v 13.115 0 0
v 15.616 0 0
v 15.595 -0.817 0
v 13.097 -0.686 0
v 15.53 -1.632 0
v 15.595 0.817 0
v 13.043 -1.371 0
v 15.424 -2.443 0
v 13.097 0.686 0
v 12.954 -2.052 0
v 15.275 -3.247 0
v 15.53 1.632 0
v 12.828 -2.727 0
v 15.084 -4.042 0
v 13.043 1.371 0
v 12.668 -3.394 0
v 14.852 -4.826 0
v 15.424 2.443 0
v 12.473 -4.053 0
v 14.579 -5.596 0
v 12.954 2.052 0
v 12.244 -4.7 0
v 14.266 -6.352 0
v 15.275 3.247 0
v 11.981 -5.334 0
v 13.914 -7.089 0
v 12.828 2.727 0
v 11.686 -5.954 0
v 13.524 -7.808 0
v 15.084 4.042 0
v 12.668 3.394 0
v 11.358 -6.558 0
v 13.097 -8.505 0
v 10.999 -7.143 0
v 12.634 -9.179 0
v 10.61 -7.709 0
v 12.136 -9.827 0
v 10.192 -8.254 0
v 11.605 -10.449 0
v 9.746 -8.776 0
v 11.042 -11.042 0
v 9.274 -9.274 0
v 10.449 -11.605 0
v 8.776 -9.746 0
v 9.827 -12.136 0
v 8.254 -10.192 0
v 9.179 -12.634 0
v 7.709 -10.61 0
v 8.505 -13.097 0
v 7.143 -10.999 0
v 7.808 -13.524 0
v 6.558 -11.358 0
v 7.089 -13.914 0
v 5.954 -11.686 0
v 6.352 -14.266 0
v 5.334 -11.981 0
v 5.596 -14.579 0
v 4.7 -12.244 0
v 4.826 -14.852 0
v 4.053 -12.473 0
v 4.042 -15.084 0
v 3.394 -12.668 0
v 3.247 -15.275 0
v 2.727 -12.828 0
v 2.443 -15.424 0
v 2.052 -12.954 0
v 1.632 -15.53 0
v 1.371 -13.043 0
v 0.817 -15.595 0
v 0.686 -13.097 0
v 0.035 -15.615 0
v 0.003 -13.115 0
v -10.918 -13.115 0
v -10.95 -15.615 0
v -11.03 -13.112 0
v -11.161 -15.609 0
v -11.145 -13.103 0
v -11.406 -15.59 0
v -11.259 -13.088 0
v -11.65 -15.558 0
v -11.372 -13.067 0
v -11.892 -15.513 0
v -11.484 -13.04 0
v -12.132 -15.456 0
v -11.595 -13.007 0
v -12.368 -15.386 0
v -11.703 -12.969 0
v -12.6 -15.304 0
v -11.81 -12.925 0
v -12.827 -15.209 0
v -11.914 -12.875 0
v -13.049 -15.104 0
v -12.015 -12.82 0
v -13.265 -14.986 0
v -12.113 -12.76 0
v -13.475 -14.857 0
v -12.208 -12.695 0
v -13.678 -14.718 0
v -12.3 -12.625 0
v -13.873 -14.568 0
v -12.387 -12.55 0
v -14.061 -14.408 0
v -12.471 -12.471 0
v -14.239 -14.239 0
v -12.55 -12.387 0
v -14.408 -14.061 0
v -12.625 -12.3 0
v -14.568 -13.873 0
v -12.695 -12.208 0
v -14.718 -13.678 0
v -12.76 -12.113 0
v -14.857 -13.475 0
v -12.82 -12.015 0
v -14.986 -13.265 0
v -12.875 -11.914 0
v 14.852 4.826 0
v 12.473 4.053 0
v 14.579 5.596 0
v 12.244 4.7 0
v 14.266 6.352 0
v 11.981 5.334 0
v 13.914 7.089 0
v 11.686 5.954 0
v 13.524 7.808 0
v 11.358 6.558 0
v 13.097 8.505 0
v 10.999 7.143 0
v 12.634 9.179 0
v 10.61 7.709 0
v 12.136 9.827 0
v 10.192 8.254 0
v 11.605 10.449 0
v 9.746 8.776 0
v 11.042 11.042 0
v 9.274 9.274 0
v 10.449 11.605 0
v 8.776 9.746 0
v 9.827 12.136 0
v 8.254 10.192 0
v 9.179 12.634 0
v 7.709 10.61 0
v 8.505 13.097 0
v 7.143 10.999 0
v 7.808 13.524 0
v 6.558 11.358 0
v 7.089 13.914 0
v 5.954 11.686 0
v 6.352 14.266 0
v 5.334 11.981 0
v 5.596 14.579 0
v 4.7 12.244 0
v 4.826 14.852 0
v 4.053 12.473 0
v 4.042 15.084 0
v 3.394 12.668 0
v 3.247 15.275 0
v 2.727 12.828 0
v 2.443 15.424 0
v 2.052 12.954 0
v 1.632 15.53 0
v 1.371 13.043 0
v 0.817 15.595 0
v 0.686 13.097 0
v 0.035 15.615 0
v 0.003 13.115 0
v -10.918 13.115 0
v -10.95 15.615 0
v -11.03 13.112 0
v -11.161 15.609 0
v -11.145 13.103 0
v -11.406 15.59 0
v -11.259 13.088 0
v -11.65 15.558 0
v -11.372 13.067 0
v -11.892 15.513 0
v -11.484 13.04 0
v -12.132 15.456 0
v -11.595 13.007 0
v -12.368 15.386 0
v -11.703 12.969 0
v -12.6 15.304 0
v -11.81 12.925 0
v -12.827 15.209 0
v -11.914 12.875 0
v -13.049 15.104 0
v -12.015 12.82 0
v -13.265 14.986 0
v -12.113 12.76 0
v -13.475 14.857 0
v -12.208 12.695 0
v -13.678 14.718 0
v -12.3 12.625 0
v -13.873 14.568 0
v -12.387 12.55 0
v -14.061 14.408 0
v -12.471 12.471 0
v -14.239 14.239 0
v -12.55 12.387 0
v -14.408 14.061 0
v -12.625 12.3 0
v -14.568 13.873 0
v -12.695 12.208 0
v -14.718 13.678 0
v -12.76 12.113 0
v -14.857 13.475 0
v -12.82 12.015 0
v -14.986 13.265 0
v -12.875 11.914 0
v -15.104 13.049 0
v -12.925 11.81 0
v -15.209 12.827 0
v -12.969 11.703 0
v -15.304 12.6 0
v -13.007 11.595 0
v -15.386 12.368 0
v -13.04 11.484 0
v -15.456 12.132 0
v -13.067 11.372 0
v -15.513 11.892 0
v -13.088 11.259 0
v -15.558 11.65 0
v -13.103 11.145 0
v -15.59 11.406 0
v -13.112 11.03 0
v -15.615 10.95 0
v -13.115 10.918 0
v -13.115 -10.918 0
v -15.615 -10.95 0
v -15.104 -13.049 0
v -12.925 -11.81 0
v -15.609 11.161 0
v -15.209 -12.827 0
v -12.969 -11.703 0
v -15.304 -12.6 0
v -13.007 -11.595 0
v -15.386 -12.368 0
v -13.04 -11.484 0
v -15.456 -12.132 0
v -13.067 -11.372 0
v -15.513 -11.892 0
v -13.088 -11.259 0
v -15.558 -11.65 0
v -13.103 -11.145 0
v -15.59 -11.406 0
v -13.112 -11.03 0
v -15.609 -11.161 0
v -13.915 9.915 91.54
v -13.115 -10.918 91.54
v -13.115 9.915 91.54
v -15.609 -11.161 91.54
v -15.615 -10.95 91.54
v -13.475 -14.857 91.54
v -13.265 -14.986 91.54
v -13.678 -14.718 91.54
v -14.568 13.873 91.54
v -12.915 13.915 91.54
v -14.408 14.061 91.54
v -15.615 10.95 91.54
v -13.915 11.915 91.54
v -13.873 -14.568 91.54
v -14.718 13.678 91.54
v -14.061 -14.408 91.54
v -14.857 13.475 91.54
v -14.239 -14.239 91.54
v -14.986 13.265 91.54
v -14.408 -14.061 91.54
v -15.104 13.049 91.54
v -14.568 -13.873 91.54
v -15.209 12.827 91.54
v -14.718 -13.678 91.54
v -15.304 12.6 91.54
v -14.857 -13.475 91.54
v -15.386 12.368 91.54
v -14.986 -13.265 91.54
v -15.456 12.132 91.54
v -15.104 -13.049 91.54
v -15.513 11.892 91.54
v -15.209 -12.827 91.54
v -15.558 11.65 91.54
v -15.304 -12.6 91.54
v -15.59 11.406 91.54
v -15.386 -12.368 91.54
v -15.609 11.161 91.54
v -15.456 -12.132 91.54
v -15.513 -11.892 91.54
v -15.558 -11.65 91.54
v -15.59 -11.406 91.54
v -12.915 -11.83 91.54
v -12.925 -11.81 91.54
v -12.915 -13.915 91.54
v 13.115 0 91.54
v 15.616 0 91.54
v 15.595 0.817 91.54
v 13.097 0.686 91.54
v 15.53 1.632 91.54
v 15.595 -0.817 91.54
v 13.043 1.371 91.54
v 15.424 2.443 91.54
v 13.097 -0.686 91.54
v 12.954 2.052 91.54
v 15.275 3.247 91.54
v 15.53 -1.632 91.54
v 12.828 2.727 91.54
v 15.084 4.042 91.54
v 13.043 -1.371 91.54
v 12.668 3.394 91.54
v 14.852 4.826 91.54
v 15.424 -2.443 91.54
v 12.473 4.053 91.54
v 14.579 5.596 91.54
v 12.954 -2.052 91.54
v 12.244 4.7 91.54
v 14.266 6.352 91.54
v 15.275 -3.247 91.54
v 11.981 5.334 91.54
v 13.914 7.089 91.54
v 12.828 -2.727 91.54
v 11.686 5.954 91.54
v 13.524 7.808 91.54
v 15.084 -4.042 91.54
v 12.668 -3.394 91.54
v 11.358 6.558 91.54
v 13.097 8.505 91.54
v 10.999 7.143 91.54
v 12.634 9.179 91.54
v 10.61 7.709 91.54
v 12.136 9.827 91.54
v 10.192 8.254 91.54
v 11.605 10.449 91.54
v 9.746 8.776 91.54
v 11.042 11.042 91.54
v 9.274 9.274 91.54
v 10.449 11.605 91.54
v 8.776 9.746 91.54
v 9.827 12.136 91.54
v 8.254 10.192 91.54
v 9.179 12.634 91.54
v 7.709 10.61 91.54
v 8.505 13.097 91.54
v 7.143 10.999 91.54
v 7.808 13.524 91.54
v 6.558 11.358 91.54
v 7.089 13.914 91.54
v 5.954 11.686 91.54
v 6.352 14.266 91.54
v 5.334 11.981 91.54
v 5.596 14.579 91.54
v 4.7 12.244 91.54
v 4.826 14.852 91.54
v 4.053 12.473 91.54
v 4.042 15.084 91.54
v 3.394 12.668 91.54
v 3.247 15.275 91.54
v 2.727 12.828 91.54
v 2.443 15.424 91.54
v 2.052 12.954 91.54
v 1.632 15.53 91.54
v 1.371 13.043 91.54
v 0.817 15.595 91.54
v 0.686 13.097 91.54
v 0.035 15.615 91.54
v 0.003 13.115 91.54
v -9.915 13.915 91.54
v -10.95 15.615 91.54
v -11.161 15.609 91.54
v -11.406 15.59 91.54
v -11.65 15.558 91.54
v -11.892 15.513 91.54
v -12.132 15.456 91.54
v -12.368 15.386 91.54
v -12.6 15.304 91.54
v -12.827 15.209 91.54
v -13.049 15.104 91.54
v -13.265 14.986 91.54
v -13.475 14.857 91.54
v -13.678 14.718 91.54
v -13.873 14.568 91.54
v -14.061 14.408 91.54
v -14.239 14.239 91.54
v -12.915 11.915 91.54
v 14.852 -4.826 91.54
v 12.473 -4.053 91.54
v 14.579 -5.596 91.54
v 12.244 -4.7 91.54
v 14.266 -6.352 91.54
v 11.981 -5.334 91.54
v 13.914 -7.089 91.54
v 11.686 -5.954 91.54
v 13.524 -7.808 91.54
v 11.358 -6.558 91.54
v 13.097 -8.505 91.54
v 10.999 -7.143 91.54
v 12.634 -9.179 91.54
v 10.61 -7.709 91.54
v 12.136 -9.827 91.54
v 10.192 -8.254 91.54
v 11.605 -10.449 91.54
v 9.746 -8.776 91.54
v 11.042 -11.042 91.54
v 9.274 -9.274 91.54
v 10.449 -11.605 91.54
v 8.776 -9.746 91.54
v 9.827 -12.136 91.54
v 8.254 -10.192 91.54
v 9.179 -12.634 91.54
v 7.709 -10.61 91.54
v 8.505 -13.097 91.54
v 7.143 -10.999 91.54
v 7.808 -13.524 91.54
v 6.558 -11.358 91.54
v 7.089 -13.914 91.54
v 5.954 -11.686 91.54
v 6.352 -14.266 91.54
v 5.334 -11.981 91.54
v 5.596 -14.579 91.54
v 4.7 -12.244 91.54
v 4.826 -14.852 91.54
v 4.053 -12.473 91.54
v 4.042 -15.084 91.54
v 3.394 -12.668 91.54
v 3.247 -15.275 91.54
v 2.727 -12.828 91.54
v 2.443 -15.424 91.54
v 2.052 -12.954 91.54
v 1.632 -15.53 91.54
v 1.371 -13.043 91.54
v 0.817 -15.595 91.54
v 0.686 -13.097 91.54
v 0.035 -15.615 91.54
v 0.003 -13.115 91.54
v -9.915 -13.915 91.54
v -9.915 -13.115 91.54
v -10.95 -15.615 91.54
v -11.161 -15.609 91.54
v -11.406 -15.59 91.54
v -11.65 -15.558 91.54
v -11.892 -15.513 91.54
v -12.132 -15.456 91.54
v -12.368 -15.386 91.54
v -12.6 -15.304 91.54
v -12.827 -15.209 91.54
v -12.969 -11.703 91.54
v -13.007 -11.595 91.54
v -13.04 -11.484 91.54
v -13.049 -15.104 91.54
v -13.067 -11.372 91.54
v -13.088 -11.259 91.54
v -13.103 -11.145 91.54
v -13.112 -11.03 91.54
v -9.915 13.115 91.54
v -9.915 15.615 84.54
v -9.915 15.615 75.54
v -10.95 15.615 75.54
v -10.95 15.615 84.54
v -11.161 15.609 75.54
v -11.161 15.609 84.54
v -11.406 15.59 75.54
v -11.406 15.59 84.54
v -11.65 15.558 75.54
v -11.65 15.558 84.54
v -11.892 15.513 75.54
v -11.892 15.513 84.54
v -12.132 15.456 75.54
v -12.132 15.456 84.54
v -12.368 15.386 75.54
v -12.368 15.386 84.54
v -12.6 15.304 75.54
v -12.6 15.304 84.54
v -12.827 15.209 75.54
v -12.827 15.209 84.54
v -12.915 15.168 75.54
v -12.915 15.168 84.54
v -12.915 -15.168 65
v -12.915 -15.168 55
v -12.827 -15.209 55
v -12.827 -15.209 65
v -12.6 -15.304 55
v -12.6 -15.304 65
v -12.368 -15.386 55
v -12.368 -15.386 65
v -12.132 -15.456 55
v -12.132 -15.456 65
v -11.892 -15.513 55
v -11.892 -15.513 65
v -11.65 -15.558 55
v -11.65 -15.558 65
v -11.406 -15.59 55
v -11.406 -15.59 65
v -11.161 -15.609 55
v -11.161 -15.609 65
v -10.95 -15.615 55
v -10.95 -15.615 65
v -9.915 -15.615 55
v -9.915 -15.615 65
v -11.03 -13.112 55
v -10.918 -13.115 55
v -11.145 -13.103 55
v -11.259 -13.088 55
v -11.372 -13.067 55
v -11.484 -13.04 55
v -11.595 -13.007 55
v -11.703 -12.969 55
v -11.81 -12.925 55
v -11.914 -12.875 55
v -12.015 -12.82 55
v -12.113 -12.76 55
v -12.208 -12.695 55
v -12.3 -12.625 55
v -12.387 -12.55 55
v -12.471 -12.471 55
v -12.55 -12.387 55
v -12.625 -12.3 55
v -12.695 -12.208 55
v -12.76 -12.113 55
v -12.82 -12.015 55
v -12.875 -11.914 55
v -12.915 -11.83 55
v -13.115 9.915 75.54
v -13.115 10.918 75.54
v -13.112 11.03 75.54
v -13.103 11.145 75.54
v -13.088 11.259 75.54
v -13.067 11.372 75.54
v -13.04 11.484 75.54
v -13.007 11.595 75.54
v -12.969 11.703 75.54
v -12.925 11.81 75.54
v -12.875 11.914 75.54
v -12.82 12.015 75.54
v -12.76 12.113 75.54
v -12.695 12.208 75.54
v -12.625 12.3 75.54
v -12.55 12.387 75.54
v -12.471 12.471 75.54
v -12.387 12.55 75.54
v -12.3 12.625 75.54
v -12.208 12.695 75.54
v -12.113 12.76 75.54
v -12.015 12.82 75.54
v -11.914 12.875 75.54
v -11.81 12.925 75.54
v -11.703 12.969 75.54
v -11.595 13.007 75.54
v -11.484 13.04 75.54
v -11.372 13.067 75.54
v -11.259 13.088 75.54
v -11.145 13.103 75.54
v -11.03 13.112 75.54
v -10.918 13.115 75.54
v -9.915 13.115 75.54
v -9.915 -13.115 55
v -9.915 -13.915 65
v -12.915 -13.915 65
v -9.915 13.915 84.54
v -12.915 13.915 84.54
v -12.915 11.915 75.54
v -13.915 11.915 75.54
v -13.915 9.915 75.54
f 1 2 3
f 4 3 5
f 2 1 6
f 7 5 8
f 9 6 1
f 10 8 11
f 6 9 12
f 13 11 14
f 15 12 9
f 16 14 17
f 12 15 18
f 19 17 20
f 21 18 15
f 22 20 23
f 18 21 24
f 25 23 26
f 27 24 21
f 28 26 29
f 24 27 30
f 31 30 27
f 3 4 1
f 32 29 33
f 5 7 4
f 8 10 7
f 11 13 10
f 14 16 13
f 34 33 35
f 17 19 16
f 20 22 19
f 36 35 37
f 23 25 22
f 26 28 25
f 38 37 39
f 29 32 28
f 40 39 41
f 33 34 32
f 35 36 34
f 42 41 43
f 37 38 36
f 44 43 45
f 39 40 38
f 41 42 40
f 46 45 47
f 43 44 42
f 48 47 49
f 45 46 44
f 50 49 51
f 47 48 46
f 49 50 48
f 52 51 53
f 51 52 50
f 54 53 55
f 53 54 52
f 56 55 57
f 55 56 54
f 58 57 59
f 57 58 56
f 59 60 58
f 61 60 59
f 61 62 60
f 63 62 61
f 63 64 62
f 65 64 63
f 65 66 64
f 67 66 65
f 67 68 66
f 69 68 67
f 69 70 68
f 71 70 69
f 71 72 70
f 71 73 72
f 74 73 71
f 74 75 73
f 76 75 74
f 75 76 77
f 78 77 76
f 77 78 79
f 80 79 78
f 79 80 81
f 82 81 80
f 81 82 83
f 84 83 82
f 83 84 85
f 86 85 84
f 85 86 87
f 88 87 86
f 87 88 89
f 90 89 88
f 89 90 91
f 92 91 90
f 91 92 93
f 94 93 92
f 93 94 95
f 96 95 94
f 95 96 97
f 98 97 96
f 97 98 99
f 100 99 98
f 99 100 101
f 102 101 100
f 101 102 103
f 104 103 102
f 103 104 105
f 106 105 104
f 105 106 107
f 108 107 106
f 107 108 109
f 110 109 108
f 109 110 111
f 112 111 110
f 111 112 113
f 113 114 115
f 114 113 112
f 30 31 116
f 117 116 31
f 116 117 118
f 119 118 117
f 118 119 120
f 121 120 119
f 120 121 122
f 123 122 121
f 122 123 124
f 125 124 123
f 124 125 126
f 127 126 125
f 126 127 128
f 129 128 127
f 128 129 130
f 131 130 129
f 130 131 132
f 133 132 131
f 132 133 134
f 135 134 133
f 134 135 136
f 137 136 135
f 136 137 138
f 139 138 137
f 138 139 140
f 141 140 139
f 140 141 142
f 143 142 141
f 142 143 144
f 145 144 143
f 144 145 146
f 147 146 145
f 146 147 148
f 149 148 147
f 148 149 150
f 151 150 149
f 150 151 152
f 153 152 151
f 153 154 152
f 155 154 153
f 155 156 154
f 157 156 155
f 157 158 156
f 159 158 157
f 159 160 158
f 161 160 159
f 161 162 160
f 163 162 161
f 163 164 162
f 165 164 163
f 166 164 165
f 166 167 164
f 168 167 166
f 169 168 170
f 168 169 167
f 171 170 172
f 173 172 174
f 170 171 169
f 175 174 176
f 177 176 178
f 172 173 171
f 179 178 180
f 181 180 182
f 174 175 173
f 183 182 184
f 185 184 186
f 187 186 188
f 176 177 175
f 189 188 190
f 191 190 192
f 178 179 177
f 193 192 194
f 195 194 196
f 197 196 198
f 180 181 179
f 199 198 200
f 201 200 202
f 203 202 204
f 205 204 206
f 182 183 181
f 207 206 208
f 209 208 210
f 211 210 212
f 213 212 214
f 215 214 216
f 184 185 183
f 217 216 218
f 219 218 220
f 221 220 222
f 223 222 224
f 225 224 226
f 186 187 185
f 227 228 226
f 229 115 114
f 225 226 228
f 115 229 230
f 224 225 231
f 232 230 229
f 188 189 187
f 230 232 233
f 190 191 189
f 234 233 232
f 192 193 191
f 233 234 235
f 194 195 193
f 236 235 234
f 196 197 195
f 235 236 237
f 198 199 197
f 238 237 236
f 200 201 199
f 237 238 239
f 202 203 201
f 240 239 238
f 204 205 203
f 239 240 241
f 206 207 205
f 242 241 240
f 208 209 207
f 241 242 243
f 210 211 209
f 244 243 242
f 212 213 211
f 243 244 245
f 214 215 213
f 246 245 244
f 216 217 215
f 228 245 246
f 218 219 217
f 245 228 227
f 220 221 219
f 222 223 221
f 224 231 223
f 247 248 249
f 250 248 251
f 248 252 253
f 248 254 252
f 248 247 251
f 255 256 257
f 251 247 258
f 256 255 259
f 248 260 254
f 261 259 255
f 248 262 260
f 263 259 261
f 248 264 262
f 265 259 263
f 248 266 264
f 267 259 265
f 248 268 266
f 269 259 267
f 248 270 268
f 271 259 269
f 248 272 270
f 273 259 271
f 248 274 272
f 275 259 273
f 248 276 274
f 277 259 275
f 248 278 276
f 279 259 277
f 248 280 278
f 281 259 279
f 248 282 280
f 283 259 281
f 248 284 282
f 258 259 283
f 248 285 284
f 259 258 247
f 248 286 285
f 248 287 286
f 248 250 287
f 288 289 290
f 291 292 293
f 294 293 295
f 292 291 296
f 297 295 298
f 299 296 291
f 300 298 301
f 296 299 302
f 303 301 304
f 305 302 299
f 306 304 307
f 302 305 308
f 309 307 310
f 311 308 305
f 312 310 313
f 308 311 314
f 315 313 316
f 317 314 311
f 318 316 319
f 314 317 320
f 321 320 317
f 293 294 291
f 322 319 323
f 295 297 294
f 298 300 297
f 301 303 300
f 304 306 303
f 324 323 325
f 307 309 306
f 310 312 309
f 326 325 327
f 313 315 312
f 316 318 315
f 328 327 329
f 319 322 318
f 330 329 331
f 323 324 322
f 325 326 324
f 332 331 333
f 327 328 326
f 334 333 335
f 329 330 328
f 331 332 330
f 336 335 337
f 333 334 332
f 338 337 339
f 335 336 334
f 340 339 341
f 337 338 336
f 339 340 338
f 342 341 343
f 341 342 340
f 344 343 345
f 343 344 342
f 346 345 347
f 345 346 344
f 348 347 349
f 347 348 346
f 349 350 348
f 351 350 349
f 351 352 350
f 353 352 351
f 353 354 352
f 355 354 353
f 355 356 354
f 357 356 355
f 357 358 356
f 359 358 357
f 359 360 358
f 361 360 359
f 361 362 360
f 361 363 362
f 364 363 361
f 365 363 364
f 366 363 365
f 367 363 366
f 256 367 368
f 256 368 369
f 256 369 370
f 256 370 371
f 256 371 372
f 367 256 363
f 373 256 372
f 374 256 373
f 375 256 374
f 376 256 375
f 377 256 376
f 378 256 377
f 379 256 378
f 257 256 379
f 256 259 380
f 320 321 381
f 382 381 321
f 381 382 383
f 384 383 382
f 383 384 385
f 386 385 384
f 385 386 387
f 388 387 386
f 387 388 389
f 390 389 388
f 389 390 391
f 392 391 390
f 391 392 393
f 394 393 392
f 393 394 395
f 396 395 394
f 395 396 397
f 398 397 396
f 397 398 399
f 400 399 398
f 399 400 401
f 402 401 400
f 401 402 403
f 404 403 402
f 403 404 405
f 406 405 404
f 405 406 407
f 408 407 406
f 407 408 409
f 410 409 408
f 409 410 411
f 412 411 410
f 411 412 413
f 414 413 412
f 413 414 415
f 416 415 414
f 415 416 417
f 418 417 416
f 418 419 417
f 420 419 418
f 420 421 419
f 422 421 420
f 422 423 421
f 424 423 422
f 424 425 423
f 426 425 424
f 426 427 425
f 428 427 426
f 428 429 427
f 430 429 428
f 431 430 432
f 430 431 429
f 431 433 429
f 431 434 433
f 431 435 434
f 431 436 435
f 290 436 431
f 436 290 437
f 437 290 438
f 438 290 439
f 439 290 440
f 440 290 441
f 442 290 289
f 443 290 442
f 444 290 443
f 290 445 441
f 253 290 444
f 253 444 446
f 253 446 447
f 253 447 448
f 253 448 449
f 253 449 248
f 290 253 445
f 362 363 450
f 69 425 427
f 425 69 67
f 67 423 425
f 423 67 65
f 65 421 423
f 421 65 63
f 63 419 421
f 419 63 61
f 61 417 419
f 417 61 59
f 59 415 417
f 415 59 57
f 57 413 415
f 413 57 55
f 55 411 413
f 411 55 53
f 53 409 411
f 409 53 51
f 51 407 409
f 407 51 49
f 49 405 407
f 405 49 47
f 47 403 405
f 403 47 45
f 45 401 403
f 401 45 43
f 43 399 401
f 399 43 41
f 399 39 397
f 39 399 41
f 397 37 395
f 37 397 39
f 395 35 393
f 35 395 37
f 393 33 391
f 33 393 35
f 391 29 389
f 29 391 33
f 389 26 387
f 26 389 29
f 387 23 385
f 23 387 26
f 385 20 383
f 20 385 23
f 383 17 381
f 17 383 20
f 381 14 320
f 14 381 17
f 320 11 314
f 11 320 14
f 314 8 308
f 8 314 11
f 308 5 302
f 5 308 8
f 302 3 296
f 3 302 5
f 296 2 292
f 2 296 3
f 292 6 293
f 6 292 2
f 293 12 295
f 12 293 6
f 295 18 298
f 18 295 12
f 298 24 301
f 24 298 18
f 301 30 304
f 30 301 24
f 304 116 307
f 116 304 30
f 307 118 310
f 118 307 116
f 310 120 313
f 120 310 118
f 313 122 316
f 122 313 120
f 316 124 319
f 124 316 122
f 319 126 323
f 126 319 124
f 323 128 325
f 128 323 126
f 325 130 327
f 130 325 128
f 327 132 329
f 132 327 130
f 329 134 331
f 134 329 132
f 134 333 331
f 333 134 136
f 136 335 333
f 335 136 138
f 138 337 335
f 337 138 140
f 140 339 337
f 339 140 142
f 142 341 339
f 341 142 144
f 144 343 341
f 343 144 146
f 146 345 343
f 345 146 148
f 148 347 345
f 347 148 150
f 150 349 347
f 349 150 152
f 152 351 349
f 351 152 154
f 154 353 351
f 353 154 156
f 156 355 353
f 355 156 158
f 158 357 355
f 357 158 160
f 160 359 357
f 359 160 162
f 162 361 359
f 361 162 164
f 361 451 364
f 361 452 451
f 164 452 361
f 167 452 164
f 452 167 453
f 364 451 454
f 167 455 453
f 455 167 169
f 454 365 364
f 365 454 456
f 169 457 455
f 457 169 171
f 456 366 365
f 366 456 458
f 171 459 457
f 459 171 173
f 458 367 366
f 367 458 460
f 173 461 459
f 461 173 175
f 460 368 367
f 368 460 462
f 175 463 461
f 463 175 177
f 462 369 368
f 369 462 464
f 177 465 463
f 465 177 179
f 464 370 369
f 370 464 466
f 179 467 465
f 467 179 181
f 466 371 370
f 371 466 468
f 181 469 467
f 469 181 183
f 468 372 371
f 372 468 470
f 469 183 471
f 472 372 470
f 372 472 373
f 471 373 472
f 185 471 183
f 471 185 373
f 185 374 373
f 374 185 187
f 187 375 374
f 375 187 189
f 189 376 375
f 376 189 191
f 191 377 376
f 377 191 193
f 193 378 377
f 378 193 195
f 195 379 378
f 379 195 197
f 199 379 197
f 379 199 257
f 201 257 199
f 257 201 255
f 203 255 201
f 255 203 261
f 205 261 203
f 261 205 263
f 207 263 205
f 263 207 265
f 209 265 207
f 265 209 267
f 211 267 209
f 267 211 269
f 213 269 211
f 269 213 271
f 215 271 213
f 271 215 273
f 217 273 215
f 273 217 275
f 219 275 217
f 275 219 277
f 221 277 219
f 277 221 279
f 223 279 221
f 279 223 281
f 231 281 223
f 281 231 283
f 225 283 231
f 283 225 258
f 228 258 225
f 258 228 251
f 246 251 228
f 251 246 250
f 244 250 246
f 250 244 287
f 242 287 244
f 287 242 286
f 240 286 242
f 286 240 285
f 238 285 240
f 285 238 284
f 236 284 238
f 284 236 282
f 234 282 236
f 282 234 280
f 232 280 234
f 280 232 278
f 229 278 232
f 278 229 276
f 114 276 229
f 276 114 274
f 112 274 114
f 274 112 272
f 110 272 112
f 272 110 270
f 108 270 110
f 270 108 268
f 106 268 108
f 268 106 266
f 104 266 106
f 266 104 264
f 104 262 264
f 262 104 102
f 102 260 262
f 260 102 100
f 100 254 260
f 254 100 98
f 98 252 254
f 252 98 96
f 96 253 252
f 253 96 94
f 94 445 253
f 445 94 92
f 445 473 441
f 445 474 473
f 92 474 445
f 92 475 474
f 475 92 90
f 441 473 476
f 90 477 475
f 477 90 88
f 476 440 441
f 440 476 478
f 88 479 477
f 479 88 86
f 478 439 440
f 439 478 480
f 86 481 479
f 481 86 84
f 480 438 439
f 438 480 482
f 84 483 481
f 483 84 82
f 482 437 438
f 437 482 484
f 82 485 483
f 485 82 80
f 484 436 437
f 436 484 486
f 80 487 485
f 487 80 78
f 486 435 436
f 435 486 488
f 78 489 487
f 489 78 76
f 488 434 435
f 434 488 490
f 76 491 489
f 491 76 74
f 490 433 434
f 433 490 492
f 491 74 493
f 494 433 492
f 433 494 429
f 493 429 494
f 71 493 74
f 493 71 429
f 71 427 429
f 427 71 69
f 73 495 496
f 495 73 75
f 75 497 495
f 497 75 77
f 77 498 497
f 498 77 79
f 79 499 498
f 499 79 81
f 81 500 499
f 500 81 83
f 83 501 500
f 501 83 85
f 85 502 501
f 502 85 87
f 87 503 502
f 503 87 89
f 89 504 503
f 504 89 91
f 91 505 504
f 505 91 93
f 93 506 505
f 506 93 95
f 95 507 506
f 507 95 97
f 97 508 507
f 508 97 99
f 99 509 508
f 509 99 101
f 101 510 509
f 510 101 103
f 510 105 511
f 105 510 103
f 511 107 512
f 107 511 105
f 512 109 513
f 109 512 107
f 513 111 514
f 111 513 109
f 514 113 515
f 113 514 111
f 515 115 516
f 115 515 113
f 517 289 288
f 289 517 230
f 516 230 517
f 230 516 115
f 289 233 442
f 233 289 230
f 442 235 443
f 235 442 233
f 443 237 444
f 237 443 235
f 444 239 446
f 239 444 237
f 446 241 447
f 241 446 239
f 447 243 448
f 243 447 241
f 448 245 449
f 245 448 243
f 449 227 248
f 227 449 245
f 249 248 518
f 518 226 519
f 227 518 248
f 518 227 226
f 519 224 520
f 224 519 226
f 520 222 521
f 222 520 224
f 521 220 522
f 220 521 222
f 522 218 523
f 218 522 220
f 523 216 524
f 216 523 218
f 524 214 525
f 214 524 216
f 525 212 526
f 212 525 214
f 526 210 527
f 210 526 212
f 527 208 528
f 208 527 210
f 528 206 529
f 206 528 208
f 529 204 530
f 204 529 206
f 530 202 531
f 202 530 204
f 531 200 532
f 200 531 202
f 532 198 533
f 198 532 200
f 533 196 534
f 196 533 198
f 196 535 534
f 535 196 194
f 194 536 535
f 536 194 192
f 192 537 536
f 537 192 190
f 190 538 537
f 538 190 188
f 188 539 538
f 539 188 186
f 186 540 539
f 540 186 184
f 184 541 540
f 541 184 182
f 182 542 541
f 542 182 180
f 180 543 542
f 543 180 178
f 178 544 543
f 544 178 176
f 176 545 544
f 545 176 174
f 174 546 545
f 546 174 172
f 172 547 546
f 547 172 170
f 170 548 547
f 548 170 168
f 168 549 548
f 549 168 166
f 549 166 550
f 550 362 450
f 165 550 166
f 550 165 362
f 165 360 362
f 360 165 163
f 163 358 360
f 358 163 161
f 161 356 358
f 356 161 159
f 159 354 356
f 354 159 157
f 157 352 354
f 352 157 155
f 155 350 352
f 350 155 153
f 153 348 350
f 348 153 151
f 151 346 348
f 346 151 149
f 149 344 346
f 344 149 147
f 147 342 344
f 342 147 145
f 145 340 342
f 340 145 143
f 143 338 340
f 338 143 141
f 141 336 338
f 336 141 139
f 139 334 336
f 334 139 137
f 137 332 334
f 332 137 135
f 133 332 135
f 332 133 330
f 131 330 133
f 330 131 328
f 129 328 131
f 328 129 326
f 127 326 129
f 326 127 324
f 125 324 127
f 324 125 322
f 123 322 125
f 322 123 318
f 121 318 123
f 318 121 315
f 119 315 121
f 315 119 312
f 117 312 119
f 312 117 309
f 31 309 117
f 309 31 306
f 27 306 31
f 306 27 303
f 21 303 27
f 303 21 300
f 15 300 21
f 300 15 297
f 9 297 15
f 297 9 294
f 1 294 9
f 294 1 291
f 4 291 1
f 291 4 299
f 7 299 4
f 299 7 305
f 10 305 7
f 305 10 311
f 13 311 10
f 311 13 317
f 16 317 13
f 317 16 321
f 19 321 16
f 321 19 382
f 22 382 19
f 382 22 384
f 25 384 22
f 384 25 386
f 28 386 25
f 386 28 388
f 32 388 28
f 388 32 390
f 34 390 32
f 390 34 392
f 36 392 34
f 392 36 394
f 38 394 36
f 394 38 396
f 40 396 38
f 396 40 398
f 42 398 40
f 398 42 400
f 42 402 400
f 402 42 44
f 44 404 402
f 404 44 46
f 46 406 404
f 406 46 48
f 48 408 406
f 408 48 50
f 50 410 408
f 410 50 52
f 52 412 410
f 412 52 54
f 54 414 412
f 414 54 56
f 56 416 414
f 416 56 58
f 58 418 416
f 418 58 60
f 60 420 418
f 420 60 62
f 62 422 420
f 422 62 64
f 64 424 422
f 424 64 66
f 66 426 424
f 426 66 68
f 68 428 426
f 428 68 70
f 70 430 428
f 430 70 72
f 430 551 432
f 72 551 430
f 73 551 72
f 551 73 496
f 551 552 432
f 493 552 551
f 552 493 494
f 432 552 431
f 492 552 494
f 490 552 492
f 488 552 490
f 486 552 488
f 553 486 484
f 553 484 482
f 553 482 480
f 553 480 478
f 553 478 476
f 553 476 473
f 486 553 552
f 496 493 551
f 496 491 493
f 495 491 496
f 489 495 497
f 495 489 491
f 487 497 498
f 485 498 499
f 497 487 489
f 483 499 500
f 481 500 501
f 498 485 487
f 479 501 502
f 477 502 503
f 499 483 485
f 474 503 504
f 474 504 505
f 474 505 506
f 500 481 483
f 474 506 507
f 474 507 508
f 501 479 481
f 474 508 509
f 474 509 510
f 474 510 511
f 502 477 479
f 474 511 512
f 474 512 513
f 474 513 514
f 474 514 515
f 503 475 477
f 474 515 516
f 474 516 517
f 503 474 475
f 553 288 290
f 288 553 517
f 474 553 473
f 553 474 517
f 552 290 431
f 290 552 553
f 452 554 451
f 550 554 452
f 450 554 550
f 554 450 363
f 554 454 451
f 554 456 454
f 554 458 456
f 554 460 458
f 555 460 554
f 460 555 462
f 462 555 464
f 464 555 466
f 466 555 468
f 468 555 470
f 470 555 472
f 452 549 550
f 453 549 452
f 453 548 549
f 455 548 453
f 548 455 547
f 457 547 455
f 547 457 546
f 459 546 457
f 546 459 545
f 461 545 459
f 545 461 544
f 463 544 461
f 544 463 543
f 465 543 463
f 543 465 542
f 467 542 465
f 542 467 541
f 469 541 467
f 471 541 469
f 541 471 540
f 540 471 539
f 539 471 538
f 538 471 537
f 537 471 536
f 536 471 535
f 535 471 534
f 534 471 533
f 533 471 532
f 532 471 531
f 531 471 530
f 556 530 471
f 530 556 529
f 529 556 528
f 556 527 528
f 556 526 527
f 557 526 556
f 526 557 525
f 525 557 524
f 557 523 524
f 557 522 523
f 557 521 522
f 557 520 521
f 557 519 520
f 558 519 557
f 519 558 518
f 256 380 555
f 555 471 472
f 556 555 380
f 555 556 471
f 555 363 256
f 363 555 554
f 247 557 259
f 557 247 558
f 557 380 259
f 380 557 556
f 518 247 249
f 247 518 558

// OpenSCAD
board_width = 25.83;
board_length = 91.54;
board_thickness = 1.75;

//these should be largely unnecessary, except clearance
holder_length = 77;
holder_width = 21;
holder_tolerance = 1;
holder_clearance = 20;

pin_start_distance = 14.6;
pin_edge_distance = 2.2;
pin_pitch = 2.54;

// 12 and 14 are extra 3v3 and Ground pins
// we leave them out to avoid print issues
pin_positions = [0:15];

corner_hole_diameter = 3;
corner_hole_radius = corner_hole_diameter/2;
corner_hole_inset_radius = 0.66;
outer_corner_r = corner_hole_diameter/2 + corner_hole_inset_radius;
peg_tolerance = 0.1;

pin_grasp_length = 5;
pin_press_length = 2.5;
pin_hole = 1.2;

$fn = 120;

brim_height = 0.2;
brim_distance = 0.2;
brim_r=5;

tab_width = 4.5;
tab_height = 4.5;
tab_depth = 1;

tube_r = 2;
tube_thickness = 2.5;
tube_tolerance = 0.2;

port_start = 55;
port_width = 10;
port_height = 3;

switch_start = board_length - 16;
switch_width = 9;
switch_height = 3;

module mirrored () {
  union () {
    children();
    mirror([1,0]) children();
  }
}

module pogo_jig() {
  difference () {
    union() {
      linear_extrude(pin_grasp_length) hull() mirrored()
        translate([board_length/2-outer_corner_r,0]) circle(r=outer_corner_r);
      mirrored() translate([board_length/2-outer_corner_r,0]) {
        linear_extrude(brim_height) circle(r=brim_r);
        linear_extrude(pin_grasp_length+pin_press_length) circle(r=outer_corner_r);
        linear_extrude(pin_grasp_length+pin_press_length+board_thickness) circle(r=corner_hole_radius - peg_tolerance);
      }
      translate([1,outer_corner_r+tab_depth/2-.1,pin_grasp_length-(tab_height-pin_press_length)/2]) cube([tab_width,tab_depth+.2,tab_height-pin_press_length],center=true);
      translate([1-tab_width/2,outer_corner_r+tab_depth-0.4,0]) cube([tab_width,0.8,pin_grasp_length-(tab_height-pin_press_length)-0.2]);
    }
    translate([0,0,-.5]) linear_extrude(pin_grasp_length+1) mirror([1,0,0]) union() {
      for (x=pin_positions) {
        translate([-board_length/2+pin_start_distance+pin_pitch*x, -outer_corner_r+pin_edge_distance]) {
          circle(d=pin_hole);
          translate([-0.1,-5]) square([0.2,5]);
        }
      }
    }
  }
}

module tube_cavity() {
  offset(delta=tube_tolerance) hull () {
    translate([-board_width/2+tube_r,board_width/2-tube_r,]) circle(r=tube_r);
    translate([-board_width/2+tube_r,-board_width/2+tube_r]) circle(r=tube_r);
    circle(d=board_width);
  }
}

module battery_tube() {
  difference() {
    linear_extrude(board_length,convexity=10) difference () {
      offset(delta=tube_thickness) tube_cavity();
      tube_cavity();
    };
    translate([-board_width/2,-board_width/2-tube_thickness-1,port_start])
      cube([port_height,tube_r+tube_thickness+1,port_width]);
    translate([-board_width/2,-board_width/2-1,port_start])
      cube([port_height,1+tube_r,board_length-port_start+1]);
    translate([-board_width/2,board_width/2-tube_r,switch_start])
      cube([switch_height,tube_r+tube_thickness+1,switch_width]);
    translate([-board_width/2,board_width/2-tube_r,switch_start])
      cube([switch_height,1+tube_r,board_length-switch_start+1]);
    translate([-board_width/2-1,board_width/2-tube_r-1,switch_start])
      cube([switch_height+1,tube_r,board_length-switch_start+1]);
  }
}
battery_tube();
/*intersection() {
  translate([0,0,-86]) battery_tube();
  translate([-50,-50,0]) cube([100,100,5]);
}*/
